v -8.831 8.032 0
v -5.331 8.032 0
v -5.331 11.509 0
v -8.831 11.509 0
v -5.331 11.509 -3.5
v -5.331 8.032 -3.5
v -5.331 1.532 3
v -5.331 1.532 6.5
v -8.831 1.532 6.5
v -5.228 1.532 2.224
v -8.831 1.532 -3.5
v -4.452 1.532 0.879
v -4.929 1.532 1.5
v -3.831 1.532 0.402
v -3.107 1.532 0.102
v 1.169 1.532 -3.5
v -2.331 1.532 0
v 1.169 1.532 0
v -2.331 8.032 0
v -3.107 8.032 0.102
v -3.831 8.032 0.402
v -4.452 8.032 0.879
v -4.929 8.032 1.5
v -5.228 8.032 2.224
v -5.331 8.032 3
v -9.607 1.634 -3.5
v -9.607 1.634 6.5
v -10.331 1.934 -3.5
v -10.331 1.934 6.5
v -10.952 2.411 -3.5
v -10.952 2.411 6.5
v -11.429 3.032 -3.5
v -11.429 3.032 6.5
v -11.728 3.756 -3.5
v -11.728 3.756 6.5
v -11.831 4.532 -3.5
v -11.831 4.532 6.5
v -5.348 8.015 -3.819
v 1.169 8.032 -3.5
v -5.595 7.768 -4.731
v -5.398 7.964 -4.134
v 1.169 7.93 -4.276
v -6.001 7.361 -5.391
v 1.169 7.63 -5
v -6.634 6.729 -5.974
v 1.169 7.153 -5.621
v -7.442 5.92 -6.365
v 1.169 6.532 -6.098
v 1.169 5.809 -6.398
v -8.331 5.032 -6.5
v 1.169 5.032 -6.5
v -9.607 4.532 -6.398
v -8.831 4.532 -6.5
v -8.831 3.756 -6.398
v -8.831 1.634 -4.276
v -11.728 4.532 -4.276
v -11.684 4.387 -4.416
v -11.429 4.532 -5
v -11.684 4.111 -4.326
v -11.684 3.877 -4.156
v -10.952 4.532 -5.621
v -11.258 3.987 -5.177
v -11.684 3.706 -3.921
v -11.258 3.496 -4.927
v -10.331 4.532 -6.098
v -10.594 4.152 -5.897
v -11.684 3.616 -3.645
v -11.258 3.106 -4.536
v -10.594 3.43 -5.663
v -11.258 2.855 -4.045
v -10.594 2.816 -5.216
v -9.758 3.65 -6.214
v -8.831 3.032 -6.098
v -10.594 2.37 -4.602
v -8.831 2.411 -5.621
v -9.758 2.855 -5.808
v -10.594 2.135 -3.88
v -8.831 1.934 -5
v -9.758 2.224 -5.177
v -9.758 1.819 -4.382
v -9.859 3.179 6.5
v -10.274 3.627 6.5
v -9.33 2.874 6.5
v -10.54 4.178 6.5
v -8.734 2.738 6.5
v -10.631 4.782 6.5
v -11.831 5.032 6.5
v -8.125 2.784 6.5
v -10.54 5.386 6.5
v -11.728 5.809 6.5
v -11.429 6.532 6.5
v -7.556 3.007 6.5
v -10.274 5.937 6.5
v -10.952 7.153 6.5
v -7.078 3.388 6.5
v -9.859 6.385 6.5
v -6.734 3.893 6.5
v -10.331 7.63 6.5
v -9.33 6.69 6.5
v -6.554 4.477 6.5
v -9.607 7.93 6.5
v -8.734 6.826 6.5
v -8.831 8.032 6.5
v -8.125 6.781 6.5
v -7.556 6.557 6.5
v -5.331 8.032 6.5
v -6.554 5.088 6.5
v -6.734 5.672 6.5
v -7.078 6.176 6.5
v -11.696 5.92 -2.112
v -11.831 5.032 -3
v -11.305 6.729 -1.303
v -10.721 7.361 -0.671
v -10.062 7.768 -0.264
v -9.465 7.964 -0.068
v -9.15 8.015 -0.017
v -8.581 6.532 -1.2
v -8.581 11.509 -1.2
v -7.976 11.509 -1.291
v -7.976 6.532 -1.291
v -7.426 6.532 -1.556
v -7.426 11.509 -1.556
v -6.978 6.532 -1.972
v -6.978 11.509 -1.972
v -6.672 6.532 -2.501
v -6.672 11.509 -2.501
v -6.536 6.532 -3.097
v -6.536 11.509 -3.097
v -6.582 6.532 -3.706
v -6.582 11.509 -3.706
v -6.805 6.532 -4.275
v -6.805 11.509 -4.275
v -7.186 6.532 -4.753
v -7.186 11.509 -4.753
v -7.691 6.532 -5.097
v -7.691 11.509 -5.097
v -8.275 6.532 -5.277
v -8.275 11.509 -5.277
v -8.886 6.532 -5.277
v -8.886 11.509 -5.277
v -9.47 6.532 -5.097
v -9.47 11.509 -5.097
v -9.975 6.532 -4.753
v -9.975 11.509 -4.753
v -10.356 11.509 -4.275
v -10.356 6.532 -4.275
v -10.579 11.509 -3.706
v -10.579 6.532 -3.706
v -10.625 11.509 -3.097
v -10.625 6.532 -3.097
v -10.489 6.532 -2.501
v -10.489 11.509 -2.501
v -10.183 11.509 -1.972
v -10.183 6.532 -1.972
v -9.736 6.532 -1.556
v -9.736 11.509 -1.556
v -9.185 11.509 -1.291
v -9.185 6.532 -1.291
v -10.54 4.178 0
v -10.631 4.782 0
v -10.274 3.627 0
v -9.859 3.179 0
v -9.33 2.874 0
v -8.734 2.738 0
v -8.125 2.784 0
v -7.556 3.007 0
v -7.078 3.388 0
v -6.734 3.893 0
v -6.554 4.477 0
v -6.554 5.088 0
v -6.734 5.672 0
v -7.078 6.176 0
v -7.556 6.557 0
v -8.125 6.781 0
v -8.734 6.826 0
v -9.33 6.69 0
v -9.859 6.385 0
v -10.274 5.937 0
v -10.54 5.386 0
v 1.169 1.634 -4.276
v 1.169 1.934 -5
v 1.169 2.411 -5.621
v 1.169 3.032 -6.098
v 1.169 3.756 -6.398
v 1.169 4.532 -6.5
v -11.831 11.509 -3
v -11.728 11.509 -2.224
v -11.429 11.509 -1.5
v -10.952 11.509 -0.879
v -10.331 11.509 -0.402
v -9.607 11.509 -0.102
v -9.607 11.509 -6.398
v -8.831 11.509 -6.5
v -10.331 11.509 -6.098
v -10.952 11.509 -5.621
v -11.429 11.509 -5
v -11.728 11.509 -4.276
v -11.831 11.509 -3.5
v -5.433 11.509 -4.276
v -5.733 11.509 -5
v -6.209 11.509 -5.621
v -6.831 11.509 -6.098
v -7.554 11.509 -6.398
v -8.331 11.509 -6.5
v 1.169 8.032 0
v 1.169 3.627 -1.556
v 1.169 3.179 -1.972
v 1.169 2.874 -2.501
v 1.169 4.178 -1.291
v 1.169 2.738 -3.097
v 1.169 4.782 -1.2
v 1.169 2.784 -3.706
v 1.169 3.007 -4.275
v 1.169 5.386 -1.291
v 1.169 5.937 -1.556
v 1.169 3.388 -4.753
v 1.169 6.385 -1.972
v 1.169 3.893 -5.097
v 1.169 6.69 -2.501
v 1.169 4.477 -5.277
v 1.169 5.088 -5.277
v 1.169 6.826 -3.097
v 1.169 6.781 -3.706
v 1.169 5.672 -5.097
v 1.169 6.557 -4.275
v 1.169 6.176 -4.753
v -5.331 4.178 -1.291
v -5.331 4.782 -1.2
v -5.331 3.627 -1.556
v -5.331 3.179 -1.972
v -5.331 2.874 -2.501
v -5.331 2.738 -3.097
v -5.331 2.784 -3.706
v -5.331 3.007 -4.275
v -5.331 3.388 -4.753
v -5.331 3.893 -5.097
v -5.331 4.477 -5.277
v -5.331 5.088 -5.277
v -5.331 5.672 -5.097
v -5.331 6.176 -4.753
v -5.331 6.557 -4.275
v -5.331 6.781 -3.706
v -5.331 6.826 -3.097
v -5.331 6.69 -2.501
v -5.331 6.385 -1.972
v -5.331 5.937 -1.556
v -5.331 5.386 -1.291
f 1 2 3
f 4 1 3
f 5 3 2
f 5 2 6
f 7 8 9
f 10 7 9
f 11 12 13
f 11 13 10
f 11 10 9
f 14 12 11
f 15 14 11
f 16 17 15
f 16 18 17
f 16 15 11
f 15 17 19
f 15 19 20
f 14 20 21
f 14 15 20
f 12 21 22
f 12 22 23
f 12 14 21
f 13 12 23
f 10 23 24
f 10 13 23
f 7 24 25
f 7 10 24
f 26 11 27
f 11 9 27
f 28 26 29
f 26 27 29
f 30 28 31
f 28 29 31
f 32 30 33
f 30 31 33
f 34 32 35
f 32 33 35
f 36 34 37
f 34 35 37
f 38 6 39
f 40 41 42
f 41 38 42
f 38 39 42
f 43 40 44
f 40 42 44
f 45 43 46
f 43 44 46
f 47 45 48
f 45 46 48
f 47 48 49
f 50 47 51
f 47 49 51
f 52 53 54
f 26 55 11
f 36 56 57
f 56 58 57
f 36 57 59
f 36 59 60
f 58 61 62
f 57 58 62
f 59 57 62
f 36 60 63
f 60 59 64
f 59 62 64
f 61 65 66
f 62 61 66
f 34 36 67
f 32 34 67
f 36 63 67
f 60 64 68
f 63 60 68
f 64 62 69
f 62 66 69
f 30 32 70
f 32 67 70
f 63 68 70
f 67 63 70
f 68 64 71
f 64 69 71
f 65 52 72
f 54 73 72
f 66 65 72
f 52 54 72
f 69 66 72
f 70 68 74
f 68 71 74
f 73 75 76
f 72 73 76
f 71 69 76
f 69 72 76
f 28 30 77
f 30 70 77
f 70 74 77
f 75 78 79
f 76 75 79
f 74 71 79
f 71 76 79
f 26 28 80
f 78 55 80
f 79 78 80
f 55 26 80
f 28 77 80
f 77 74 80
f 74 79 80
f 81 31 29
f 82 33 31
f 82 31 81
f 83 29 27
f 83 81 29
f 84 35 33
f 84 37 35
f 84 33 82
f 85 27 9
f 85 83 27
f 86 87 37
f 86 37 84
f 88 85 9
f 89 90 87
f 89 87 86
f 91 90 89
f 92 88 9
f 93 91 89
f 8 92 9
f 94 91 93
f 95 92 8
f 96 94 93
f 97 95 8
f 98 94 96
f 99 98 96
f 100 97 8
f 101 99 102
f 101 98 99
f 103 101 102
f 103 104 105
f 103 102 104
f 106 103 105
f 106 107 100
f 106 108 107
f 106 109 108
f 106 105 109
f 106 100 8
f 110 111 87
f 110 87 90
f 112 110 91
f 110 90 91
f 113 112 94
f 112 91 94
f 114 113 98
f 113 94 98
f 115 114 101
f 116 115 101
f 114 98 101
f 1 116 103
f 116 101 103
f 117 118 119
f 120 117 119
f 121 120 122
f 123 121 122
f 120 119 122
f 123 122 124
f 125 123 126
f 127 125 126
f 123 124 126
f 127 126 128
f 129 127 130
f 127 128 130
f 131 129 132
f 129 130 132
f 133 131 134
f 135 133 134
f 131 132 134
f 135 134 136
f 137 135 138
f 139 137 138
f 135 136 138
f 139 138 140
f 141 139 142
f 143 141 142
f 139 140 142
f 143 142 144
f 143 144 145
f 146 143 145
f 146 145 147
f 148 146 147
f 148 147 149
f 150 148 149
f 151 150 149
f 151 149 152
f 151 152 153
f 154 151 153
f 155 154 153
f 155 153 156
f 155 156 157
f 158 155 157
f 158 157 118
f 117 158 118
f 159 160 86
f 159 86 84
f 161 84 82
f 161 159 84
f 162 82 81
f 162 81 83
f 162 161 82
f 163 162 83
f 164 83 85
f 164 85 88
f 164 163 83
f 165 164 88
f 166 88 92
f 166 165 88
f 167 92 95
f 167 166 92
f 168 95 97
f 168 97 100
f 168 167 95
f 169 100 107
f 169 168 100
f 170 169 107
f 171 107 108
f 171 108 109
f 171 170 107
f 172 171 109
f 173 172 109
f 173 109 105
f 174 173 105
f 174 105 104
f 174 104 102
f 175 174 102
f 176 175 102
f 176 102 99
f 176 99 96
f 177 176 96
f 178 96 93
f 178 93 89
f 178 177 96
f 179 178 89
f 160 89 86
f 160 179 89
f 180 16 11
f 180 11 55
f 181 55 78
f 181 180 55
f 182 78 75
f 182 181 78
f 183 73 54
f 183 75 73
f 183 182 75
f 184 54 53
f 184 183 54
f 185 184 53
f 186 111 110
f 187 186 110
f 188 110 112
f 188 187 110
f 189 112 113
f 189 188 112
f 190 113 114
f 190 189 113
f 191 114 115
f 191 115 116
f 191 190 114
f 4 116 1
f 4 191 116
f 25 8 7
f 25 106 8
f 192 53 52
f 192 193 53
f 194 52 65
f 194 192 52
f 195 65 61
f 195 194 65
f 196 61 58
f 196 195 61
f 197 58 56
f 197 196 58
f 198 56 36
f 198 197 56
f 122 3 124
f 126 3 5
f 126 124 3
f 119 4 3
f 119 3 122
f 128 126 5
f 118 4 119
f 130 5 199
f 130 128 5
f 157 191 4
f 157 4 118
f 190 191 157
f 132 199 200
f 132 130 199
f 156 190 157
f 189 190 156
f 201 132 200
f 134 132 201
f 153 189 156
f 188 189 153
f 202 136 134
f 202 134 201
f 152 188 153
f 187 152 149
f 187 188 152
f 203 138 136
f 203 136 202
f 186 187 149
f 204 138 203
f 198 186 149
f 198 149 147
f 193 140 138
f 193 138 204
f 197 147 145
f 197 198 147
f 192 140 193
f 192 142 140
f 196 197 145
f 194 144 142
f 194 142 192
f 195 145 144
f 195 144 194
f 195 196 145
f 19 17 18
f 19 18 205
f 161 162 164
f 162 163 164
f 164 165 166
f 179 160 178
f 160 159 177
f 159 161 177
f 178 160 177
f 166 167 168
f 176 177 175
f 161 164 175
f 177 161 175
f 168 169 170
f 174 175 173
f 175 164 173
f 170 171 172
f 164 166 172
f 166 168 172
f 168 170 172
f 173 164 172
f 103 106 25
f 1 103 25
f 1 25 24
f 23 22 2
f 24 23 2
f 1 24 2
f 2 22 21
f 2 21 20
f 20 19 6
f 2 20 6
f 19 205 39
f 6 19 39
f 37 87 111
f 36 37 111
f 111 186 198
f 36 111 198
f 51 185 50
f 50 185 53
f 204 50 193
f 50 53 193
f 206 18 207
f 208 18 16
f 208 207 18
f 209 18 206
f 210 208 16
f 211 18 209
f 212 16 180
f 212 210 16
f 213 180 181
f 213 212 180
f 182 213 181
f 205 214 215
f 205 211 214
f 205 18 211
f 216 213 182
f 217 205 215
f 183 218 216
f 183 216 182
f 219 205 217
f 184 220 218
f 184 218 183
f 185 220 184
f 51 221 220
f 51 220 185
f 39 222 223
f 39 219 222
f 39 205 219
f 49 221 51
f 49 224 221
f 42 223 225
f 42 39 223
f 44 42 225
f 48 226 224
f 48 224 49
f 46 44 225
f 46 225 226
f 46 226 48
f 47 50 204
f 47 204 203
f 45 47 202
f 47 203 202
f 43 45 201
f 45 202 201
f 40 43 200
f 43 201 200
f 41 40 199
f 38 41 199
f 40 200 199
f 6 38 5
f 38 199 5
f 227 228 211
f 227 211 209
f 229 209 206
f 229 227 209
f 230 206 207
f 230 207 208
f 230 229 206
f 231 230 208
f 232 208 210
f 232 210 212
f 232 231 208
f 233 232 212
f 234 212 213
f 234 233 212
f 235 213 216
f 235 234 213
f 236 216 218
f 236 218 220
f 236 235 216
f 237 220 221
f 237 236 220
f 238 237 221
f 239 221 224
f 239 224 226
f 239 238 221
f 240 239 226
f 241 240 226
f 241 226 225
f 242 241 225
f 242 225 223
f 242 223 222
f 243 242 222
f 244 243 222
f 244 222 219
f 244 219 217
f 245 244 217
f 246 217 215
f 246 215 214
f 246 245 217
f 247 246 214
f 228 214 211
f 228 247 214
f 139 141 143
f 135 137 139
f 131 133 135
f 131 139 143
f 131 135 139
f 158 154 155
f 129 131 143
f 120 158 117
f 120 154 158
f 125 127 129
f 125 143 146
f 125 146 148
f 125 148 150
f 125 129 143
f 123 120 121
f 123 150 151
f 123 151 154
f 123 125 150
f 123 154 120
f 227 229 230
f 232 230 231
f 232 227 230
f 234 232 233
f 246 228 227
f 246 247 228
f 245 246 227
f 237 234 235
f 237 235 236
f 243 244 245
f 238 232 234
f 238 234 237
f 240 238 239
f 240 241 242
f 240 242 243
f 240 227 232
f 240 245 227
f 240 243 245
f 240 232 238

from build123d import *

# Parameters (mm, degrees)
SKETCH_1_W               = 6.5
SKETCH_1_H               = 6.5
SKETCH_1_R               = 2.05
EXTRUDE_1_DEPTH          = 6.5
SKETCH_2_W               = 6.5
SKETCH_2_H               = 13
EXTRUDE_2_DEPTH          = 6.5
SKETCH_3_W               = 6.5
SKETCH_3_H               = 6.5
SKETCH_3_R               = 2.05
EXTRUDE_3_DEPTH          = 6.5
SKETCH_4_R               = 2.05
CUT_EXTRUDE_1_DEPTH      = 8
FILLET_1_R               = 3
FILLET_2_R               = 3
CUT_EXTRUDE_2_DEPTH      = 18.195428818
CUT_EXTRUDE_2_DEPTH_BACK = 18.195428818
SKETCH_5_W               = 7.542755484
SKETCH_5_H               = 3.936219418


with BuildPart() as part:
    # 草图1 → 凸台-拉伸1 (new body)
    with BuildSketch(Plane.XY):
        with Locations((-8.580694703, 4.782128964)):
            Rectangle(SKETCH_1_W, SKETCH_1_H)
        with Locations(Location((-8.580694703, 4.782128964, 0), (0, 0, 180))):
            Circle(SKETCH_1_R, mode=Mode.SUBTRACT)
    extrude(amount=EXTRUDE_1_DEPTH)

    # 草图2 → 凸台-拉伸2 (add)
    with BuildSketch(Plane(origin=(-5.330694703, 0, 0), x_dir=(0, 0, -1), z_dir=(1, 0, 0))):
        with Locations((3.25, 8.032128964)):
            Rectangle(SKETCH_2_W, SKETCH_2_H)
    extrude(amount=-EXTRUDE_2_DEPTH)

    # 草图3 → 凸台-拉伸3 (add)
    with BuildSketch(Plane(origin=(-5.330694703, 0, 0), x_dir=(0, 0, -1), z_dir=(1, 0, 0))):
        with Locations((3.25, 4.782128964)):
            Rectangle(SKETCH_3_W, SKETCH_3_H)
        with Locations(Location((3.25, 4.782128964, 0), (0, 0, 180))):
            Circle(SKETCH_3_R, mode=Mode.SUBTRACT)
    extrude(amount=EXTRUDE_3_DEPTH)

    # 草图4 → 切除-拉伸1 (cut)
    with BuildSketch(Plane(origin=(0, 14.532128964, 0), x_dir=(1, 0, 0), z_dir=(0, 1, 0))):
        with Locations(Location((-8.580694703, 3.25, 0), (0, 0, 270))):
            Circle(SKETCH_4_R)
    extrude(amount=-CUT_EXTRUDE_1_DEPTH, mode=Mode.SUBTRACT)

    # 圆角1
    fillet_1_edges = [part.edges().sort_by_distance(p)[0] for p in [
        (-5.330694703, 1.532128964, -6.5),
        (-11.830694703, 11.282128964, 0),
        (-11.830694703, 8.032128964, -6.5),
        (-5.330694703, 11.282128964, -6.5),
        (-2.080694703, 8.032128964, -6.5),
        (-11.830694703, 1.532128964, 0),
        (-11.830694703, 8.032128964, 3.25),
    ]]
    fillet(fillet_1_edges, radius=FILLET_1_R)

    # 圆角2
    # the kernel refuses this fillet: 3 mm, written as the material it adds along each edge
    with BuildSketch(Plane(origin=(-5.330694703, 1.532128964, 0), x_dir=(0, 0, 1), z_dir=(0, 1, 0))) as fillet_2_piece_1:
        with BuildLine():
            CenterArc((FILLET_2_R, FILLET_2_R), FILLET_2_R, 180, 90)
            Line((0, FILLET_2_R), (0, 0))
            Line((0, 0), (FILLET_2_R, 0))
        make_face()
    extrude(amount=6.5)

    # 草图5 → 切除-拉伸2 (cut, two sides: drawn at the far end of the back side and taken through both)
    with BuildSketch(Plane(origin=(-5.330694703, 0, 0), x_dir=(0, 0, -1), z_dir=(1, 0, 0)).offset(-CUT_EXTRUDE_2_DEPTH_BACK)):
        with Locations((3.771377742, 13.476899479)):
            Rectangle(SKETCH_5_W, SKETCH_5_H)
    extrude(amount=CUT_EXTRUDE_2_DEPTH + CUT_EXTRUDE_2_DEPTH_BACK, mode=Mode.SUBTRACT)


solid = part.part
